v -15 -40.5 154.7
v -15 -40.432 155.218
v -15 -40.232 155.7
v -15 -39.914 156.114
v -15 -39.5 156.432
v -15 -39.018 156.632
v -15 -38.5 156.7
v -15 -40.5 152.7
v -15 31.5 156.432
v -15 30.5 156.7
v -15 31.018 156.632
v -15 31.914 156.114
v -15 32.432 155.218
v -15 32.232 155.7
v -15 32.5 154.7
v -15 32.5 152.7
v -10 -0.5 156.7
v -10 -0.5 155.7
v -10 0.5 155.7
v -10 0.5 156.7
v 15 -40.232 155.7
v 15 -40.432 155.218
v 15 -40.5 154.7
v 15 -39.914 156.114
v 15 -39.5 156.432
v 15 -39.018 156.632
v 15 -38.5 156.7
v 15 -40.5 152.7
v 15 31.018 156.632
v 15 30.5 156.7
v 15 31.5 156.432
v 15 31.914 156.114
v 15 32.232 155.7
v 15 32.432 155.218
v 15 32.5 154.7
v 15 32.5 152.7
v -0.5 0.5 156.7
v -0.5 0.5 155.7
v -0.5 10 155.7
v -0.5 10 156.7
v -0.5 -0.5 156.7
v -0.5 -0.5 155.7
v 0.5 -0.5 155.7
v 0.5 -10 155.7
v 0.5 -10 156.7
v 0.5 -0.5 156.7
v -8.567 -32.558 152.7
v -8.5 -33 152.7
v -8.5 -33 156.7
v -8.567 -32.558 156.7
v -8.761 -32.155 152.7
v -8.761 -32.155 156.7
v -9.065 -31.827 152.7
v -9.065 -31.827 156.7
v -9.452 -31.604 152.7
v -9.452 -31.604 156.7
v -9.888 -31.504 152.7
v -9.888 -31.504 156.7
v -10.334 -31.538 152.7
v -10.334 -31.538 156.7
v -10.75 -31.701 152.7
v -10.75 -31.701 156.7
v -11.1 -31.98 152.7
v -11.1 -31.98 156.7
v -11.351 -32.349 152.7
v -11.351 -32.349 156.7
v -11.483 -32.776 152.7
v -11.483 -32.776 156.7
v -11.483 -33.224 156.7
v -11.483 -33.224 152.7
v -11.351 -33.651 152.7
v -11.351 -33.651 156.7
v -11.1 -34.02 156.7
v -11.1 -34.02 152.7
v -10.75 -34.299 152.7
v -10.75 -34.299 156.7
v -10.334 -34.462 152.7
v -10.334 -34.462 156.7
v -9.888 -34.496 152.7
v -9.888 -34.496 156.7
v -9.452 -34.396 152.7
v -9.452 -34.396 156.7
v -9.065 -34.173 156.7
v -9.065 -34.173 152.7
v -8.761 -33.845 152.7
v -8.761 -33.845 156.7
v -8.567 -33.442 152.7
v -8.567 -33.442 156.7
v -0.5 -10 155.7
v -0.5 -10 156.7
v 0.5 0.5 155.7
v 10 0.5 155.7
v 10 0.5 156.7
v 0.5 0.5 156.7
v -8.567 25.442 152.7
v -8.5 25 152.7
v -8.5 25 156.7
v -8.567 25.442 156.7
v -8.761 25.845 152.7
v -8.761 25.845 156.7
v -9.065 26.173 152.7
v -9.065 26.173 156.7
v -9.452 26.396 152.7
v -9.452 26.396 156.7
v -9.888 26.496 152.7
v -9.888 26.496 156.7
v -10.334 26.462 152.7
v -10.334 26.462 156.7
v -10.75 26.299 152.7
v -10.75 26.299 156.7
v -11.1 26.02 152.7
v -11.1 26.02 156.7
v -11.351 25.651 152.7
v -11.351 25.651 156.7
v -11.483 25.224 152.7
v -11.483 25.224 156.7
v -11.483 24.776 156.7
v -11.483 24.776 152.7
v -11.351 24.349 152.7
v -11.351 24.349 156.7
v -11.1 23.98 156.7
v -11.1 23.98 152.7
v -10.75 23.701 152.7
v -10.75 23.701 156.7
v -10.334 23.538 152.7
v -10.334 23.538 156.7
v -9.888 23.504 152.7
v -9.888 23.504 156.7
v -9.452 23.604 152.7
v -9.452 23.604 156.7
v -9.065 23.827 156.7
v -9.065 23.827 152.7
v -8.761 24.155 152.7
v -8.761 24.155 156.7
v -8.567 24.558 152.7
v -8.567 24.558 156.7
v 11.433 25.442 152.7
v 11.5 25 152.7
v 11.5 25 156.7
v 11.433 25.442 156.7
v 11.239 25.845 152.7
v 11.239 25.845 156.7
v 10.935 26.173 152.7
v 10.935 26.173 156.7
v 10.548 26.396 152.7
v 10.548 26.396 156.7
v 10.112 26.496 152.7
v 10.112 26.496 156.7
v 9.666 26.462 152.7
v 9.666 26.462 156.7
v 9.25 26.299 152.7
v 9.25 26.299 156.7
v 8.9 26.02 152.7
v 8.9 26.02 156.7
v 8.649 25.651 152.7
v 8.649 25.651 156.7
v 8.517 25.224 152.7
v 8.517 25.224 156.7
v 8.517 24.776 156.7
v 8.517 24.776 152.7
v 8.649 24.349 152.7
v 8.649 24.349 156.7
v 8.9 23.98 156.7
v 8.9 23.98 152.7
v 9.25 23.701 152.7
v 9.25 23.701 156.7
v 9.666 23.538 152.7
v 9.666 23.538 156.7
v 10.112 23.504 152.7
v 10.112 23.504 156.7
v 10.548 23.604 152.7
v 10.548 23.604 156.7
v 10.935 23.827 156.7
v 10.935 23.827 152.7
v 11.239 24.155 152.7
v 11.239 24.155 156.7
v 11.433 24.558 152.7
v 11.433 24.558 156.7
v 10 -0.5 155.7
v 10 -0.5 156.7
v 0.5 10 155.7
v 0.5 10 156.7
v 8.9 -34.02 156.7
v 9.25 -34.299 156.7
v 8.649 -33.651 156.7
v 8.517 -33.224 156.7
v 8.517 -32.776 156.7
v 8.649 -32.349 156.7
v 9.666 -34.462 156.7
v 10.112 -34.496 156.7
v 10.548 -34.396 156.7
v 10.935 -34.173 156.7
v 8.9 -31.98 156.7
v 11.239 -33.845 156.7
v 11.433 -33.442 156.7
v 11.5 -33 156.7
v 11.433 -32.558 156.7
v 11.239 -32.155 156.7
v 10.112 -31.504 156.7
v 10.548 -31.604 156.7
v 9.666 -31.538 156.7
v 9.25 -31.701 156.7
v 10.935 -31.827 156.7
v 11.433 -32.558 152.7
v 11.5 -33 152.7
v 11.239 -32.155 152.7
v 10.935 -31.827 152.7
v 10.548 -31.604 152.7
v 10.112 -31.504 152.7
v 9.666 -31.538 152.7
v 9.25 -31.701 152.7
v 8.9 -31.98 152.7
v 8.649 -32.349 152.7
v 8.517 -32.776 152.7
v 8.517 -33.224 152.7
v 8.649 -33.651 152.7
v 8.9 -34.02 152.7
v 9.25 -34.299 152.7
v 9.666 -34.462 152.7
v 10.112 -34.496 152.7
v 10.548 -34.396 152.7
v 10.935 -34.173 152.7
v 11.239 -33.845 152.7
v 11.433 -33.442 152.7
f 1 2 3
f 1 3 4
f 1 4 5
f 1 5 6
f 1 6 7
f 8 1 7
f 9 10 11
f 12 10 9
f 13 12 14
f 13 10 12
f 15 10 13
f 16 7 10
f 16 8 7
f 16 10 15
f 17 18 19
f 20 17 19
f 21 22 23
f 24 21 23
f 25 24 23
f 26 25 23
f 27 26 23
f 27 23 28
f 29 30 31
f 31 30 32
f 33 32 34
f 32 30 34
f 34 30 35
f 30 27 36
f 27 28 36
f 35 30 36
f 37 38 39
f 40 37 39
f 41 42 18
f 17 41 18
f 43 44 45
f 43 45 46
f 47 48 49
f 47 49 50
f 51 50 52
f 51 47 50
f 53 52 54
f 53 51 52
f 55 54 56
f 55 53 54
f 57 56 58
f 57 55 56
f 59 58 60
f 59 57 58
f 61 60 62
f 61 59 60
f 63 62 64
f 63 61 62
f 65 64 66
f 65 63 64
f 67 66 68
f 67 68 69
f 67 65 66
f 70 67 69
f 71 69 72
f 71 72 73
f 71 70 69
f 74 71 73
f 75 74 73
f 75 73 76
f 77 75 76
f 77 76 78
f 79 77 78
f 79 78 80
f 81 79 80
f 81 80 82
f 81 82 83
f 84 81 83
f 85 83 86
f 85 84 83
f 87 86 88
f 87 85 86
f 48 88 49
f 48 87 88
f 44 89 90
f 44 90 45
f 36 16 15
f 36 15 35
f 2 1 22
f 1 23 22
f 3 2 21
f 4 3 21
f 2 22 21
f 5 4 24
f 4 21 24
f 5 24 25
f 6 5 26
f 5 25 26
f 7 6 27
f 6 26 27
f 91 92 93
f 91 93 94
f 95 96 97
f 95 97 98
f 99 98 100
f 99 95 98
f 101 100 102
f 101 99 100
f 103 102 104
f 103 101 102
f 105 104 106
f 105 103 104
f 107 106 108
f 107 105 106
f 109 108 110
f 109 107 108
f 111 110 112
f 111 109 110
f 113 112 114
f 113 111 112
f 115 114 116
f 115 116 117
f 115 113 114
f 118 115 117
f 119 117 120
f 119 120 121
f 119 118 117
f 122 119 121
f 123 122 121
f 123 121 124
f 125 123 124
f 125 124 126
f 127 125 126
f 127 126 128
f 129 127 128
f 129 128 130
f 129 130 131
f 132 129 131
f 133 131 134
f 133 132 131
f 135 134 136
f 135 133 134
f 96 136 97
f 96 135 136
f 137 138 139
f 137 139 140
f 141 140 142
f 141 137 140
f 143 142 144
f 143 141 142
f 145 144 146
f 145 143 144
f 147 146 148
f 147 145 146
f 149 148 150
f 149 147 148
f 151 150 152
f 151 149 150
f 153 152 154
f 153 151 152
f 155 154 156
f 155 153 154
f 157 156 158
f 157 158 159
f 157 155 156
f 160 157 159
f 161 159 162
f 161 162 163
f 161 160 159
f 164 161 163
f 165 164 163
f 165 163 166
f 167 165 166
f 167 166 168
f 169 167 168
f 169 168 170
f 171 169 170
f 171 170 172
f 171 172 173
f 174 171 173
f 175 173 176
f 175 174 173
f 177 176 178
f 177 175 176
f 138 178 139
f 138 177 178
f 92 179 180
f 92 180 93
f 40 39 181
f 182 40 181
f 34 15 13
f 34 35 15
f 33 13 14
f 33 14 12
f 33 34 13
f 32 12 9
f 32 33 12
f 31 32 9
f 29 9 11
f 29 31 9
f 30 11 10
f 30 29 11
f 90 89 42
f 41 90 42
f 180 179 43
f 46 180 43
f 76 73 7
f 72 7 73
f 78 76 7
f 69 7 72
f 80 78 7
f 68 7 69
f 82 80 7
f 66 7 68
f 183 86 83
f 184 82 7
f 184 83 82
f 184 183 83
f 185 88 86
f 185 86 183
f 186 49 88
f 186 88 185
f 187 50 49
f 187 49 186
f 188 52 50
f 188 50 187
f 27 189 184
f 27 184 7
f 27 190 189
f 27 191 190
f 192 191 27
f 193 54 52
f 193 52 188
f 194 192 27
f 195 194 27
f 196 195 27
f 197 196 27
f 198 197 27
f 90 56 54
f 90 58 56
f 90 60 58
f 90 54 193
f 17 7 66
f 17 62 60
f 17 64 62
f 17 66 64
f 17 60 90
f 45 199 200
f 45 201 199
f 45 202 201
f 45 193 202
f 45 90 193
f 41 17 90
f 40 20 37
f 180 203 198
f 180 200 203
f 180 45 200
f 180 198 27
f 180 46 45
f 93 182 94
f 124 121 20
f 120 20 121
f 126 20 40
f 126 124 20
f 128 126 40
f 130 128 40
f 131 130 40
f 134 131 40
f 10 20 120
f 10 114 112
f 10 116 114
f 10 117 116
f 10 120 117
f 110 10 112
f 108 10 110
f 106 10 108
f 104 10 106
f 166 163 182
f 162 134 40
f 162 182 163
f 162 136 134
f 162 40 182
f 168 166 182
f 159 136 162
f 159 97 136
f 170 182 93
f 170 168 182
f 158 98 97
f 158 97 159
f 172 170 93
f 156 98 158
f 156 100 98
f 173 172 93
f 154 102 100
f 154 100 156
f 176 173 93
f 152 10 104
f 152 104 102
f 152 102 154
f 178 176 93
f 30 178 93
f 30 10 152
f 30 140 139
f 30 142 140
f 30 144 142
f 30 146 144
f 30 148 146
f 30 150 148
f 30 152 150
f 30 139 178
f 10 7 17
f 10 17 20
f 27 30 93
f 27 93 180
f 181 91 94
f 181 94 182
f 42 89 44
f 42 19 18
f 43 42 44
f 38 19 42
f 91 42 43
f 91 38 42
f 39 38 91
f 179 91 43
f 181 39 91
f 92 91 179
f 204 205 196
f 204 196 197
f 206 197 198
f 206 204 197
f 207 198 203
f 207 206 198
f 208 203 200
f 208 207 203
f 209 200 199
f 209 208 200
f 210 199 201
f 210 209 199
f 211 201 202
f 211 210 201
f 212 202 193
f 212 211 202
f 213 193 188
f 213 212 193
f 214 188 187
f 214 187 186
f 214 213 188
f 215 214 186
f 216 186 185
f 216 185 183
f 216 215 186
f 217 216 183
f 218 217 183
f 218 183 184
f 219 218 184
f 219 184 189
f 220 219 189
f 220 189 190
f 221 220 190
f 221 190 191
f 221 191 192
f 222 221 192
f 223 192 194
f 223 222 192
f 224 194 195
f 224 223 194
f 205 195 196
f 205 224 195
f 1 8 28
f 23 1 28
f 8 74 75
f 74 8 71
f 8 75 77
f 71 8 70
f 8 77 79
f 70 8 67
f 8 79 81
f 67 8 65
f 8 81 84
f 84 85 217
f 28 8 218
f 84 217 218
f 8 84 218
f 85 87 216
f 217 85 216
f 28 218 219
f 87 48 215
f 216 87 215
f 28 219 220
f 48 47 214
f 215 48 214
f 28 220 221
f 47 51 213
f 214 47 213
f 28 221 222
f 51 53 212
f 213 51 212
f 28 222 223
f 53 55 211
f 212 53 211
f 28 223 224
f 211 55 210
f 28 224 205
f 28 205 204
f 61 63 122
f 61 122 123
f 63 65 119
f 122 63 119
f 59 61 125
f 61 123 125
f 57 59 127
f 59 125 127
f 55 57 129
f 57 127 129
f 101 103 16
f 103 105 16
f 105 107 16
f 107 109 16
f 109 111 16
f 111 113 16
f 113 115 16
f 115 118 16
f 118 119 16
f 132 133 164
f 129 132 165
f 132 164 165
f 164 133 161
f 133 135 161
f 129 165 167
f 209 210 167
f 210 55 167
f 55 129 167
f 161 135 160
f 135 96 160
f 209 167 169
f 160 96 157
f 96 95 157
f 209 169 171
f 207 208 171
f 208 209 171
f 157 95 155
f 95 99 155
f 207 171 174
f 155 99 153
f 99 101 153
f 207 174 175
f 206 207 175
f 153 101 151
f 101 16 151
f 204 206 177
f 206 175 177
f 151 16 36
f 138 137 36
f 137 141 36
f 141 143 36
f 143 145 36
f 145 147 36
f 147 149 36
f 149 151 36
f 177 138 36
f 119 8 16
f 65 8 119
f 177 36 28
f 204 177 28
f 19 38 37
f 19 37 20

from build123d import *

# Parameters (mm, degrees)
CYLINDER041_R     = 1.5
CYLINDER041_DEPTH = 4
CYLINDER040_R     = 1.5
CYLINDER040_DEPTH = 4
CYLINDER042_R     = 1.5
CYLINDER042_DEPTH = 4
BOX010_W          = 1
BOX010_H          = 20
BOX010_DEPTH      = 1
BOX011_W          = 1
BOX011_H          = 20
BOX011_DEPTH      = 1
CYLINDER039_R     = 1.5
CYLINDER039_DEPTH = 4
BOX004_W          = 30
BOX004_H          = 73
BOX004_DEPTH      = 4
FILLET004_R       = 2


with BuildPart() as payload_plate_screw005:
    # Cylinder041 → Cylinder041 (new body)
    with BuildSketch(Plane(origin=(-10, 25, 152.7), x_dir=(1, 0, 0), z_dir=(0, 0, 1))):
        Circle(CYLINDER041_R)
    extrude(amount=CYLINDER041_DEPTH)


with BuildPart() as payload_plate_screw004:
    # Cylinder040 → Cylinder040 (new body)
    with BuildSketch(Plane(origin=(-10, -33, 152.7), x_dir=(1, 0, 0), z_dir=(0, 0, 1))):
        Circle(CYLINDER040_R)
    extrude(amount=CYLINDER040_DEPTH)


with BuildPart() as payload_plate_screw006:
    # Cylinder042 → Cylinder042 (new body)
    with BuildSketch(Plane(origin=(10, 25, 152.7), x_dir=(1, 0, 0), z_dir=(0, 0, 1))):
        Circle(CYLINDER042_R)
    extrude(amount=CYLINDER042_DEPTH)


with BuildPart() as center_plate001:
    # Box010 → Box010 (new body)
    with BuildSketch(Plane(origin=(-0.5, -10, 155.7), x_dir=(1, 0, 0), z_dir=(0, 0, 1))):
        with Locations((0.5, 10)):
            Rectangle(BOX010_W, BOX010_H)
    extrude(amount=BOX010_DEPTH)


with BuildPart() as payload_plate_center:
    # Box011 → Box011 (new body)
    with BuildSketch(Plane(origin=(10, -0.5, 155.7), x_dir=(0, 1, 0), z_dir=(0, 0, 1))):
        with Locations((0.5, 10)):
            Rectangle(BOX011_W, BOX011_H)
    extrude(amount=BOX011_DEPTH)

    # Fusion018: union center-plate001
    add(center_plate001.part)


with BuildPart() as payload_plate_screw_holes:
    # Cylinder039 → Cylinder039 (new body)
    with BuildSketch(Plane(origin=(10, -33, 152.7), x_dir=(1, 0, 0), z_dir=(0, 0, 1))):
        Circle(CYLINDER039_R)
    extrude(amount=CYLINDER039_DEPTH)

    # Compound003: union payload-plate-screw005, payload-plate-screw004, payload-plate-screw006, payload-plate-center
    add(payload_plate_screw005.part)
    add(payload_plate_screw004.part)
    add(payload_plate_screw006.part)
    add(payload_plate_center.part)


with BuildPart() as payload_plate:
    # Box004 → Box004 (new body)
    with BuildSketch(Plane(origin=(-15, -40.5, 152.7), x_dir=(1, 0, 0), z_dir=(0, 0, 1))):
        with Locations((15, 36.5)):
            Rectangle(BOX004_W, BOX004_H)
    extrude(amount=BOX004_DEPTH)

    # Fillet004
    fillet004_edges = [payload_plate.edges().sort_by_distance(p)[0] for p in [
        (0, -40.5, 156.7),
        (0, 32.5, 156.7),
    ]]
    fillet(fillet004_edges, radius=FILLET004_R)

    # Cut035: cut payload-plate-screw-holes
    add(payload_plate_screw_holes.part, mode=Mode.SUBTRACT)


solid = payload_plate.part
